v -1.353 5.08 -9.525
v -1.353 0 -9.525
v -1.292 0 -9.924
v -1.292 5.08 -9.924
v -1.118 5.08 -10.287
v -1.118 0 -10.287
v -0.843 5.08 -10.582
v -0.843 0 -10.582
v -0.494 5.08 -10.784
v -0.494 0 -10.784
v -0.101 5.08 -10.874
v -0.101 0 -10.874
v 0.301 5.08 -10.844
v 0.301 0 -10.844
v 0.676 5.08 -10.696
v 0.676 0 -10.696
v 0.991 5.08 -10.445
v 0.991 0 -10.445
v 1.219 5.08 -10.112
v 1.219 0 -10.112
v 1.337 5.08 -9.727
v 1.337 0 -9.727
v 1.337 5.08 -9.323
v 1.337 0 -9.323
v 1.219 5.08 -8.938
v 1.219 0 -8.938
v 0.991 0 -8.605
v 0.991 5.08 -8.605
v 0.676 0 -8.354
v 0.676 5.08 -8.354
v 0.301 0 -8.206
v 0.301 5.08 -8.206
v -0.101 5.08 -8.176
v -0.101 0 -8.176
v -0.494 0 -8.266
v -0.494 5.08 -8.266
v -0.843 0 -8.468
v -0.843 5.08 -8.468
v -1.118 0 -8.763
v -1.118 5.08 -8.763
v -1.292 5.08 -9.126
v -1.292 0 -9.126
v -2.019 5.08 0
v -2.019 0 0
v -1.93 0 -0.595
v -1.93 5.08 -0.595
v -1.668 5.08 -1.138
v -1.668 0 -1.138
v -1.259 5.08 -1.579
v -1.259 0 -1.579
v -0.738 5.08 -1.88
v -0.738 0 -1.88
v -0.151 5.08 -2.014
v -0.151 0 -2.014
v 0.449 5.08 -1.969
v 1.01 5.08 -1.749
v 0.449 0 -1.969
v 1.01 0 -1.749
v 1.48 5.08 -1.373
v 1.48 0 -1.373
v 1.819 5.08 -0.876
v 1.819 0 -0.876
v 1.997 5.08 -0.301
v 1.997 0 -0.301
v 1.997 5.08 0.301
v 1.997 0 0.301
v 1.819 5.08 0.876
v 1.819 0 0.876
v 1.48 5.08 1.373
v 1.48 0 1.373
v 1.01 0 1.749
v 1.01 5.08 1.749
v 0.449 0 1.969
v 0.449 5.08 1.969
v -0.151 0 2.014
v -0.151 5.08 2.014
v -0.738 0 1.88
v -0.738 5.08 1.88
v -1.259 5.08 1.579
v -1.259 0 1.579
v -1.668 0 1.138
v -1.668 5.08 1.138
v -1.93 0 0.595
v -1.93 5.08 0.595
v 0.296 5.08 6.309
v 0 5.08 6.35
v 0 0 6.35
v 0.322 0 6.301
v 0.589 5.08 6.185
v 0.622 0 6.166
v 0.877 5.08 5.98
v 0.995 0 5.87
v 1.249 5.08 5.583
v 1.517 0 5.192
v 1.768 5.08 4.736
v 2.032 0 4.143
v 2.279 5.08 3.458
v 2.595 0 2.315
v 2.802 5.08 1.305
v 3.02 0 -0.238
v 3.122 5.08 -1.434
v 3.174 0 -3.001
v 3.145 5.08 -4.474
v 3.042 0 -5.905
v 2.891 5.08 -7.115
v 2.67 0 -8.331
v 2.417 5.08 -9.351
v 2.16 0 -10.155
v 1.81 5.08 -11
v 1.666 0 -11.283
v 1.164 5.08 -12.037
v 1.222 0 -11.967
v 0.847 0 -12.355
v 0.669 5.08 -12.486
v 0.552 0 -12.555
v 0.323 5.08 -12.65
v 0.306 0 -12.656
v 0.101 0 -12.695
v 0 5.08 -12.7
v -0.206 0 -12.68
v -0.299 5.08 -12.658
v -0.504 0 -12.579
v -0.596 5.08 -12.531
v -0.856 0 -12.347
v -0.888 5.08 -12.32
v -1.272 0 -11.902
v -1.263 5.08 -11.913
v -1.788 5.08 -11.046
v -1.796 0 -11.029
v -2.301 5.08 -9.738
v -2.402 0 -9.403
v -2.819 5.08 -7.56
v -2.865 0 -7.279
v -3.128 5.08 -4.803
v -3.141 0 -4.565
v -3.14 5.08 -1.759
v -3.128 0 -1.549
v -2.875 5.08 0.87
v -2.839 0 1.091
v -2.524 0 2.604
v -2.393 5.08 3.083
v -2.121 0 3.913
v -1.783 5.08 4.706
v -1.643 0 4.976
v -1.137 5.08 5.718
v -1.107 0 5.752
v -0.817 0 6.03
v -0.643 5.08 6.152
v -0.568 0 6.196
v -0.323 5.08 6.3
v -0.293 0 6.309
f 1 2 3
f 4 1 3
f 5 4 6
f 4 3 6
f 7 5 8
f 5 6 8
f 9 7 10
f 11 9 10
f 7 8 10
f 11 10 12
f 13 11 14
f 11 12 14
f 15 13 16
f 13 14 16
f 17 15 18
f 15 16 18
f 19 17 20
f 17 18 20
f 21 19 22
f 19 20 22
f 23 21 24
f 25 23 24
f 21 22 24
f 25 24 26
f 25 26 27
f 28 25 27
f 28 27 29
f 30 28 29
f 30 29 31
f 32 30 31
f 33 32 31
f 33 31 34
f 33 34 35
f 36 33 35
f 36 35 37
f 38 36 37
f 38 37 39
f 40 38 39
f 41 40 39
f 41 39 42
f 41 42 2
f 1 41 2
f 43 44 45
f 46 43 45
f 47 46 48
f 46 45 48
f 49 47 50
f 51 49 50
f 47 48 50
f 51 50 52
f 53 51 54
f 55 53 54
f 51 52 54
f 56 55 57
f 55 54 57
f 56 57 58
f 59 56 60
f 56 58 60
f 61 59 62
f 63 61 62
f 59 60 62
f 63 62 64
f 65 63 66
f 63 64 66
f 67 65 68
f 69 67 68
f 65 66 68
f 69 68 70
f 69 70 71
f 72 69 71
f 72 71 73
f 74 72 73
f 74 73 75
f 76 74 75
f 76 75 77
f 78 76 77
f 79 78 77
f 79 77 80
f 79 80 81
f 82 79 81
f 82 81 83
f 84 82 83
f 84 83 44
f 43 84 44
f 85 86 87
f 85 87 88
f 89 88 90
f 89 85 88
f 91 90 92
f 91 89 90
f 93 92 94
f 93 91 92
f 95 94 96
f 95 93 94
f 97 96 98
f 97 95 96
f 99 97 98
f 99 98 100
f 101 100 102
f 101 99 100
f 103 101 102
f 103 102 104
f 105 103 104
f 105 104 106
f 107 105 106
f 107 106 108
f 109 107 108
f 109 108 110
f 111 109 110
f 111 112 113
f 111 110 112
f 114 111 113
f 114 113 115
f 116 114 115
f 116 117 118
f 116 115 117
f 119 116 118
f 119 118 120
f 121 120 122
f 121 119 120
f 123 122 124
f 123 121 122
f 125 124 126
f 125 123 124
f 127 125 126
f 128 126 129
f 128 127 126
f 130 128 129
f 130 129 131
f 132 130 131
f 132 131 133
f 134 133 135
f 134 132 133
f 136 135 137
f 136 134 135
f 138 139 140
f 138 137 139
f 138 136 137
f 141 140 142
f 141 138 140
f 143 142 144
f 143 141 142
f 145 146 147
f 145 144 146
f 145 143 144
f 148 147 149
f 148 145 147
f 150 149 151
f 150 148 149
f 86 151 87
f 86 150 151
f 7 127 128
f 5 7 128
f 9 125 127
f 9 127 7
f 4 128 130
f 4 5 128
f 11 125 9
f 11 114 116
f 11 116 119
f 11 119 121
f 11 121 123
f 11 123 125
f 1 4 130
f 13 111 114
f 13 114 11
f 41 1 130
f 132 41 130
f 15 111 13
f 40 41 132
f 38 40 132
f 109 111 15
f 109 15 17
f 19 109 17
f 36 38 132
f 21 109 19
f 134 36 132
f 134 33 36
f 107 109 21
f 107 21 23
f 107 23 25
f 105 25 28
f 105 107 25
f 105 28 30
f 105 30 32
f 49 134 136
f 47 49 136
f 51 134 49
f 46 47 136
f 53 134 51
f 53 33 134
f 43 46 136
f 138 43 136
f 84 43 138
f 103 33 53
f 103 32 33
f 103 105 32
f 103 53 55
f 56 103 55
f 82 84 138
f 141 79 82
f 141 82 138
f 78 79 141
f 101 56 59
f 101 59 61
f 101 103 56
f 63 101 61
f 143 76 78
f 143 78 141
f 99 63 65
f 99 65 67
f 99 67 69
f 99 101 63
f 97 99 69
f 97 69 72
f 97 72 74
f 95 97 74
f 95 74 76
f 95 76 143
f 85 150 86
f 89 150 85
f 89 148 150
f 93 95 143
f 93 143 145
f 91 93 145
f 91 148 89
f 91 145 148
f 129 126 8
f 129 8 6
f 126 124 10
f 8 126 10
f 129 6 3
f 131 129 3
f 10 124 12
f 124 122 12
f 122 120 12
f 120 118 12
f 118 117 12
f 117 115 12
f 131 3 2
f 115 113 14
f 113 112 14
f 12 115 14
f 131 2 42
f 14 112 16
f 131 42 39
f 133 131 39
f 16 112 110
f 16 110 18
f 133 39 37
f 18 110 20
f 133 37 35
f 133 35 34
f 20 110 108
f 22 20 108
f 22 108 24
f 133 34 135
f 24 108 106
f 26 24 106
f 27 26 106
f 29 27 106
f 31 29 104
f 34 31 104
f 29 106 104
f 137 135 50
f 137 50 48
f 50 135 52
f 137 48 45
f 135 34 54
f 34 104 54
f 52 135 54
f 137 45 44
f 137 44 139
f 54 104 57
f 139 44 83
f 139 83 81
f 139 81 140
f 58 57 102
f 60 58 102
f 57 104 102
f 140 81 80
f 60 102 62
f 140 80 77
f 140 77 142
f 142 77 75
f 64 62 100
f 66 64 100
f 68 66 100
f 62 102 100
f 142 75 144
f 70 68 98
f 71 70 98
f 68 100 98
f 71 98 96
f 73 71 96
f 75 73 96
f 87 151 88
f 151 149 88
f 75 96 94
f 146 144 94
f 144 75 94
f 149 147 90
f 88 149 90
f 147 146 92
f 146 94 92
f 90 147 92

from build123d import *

# Parameters (mm, degrees)
SKETCH1_R              = 15.875
BOSS_EXTRUDE1_DEPTH    = 5.08
F_10_32_TAPPED_HOLE1_D = 4.0386
F_6_32_TAPPED_HOLE1_D  = 2.7051
SKETCH7_OUTSIDE_W      = 42.788
SKETCH7_OUTSIDE_H      = 42.788
SKETCH7_OUTSIDE_RX     = 9.525
SKETCH7_OUTSIDE_RY     = 3.175
CUT_EXTRUDE1_DEPTH     = 24.01820258


with BuildPart() as part:
    # Sketch1 → Boss-Extrude1 (new body)
    with BuildSketch(Plane(origin=(0, 0, 0), x_dir=(1, 0, 0), z_dir=(0, 1, 0))):
        with Locations(Location((0, 0, 0), (0, 0, 270))):
            Circle(SKETCH1_R)
    extrude(amount=BOSS_EXTRUDE1_DEPTH)

    # #10-32 Tapped Hole1 (through all)
    with Locations(Plane(origin=(0, 5.08, 0), x_dir=(1, 0, 0), z_dir=(0, 1, 0))):
        with Locations((0, 0)):
            Hole(F_10_32_TAPPED_HOLE1_D / 2)

    # #6-32 Tapped Hole1 (through all)
    with Locations(Plane(origin=(0, 5.08, 0), x_dir=(1, 0, 0), z_dir=(0, 1, 0))):
        with Locations((0, 9.525)):
            Hole(F_6_32_TAPPED_HOLE1_D / 2)

    # Sketch7 outside → Cut-Extrude1 (cut, through all)
    with BuildSketch(Plane(origin=(0, 5.08, 0), x_dir=(1, 0, 0), z_dir=(0, 1, 0))):
        Rectangle(SKETCH7_OUTSIDE_W, SKETCH7_OUTSIDE_H)
        with Locations(Location((0, 3.175), (0, 0, -90))):
            Ellipse(SKETCH7_OUTSIDE_RX, SKETCH7_OUTSIDE_RY, mode=Mode.SUBTRACT)
    extrude(amount=-CUT_EXTRUDE1_DEPTH, mode=Mode.SUBTRACT)


solid = part.part
